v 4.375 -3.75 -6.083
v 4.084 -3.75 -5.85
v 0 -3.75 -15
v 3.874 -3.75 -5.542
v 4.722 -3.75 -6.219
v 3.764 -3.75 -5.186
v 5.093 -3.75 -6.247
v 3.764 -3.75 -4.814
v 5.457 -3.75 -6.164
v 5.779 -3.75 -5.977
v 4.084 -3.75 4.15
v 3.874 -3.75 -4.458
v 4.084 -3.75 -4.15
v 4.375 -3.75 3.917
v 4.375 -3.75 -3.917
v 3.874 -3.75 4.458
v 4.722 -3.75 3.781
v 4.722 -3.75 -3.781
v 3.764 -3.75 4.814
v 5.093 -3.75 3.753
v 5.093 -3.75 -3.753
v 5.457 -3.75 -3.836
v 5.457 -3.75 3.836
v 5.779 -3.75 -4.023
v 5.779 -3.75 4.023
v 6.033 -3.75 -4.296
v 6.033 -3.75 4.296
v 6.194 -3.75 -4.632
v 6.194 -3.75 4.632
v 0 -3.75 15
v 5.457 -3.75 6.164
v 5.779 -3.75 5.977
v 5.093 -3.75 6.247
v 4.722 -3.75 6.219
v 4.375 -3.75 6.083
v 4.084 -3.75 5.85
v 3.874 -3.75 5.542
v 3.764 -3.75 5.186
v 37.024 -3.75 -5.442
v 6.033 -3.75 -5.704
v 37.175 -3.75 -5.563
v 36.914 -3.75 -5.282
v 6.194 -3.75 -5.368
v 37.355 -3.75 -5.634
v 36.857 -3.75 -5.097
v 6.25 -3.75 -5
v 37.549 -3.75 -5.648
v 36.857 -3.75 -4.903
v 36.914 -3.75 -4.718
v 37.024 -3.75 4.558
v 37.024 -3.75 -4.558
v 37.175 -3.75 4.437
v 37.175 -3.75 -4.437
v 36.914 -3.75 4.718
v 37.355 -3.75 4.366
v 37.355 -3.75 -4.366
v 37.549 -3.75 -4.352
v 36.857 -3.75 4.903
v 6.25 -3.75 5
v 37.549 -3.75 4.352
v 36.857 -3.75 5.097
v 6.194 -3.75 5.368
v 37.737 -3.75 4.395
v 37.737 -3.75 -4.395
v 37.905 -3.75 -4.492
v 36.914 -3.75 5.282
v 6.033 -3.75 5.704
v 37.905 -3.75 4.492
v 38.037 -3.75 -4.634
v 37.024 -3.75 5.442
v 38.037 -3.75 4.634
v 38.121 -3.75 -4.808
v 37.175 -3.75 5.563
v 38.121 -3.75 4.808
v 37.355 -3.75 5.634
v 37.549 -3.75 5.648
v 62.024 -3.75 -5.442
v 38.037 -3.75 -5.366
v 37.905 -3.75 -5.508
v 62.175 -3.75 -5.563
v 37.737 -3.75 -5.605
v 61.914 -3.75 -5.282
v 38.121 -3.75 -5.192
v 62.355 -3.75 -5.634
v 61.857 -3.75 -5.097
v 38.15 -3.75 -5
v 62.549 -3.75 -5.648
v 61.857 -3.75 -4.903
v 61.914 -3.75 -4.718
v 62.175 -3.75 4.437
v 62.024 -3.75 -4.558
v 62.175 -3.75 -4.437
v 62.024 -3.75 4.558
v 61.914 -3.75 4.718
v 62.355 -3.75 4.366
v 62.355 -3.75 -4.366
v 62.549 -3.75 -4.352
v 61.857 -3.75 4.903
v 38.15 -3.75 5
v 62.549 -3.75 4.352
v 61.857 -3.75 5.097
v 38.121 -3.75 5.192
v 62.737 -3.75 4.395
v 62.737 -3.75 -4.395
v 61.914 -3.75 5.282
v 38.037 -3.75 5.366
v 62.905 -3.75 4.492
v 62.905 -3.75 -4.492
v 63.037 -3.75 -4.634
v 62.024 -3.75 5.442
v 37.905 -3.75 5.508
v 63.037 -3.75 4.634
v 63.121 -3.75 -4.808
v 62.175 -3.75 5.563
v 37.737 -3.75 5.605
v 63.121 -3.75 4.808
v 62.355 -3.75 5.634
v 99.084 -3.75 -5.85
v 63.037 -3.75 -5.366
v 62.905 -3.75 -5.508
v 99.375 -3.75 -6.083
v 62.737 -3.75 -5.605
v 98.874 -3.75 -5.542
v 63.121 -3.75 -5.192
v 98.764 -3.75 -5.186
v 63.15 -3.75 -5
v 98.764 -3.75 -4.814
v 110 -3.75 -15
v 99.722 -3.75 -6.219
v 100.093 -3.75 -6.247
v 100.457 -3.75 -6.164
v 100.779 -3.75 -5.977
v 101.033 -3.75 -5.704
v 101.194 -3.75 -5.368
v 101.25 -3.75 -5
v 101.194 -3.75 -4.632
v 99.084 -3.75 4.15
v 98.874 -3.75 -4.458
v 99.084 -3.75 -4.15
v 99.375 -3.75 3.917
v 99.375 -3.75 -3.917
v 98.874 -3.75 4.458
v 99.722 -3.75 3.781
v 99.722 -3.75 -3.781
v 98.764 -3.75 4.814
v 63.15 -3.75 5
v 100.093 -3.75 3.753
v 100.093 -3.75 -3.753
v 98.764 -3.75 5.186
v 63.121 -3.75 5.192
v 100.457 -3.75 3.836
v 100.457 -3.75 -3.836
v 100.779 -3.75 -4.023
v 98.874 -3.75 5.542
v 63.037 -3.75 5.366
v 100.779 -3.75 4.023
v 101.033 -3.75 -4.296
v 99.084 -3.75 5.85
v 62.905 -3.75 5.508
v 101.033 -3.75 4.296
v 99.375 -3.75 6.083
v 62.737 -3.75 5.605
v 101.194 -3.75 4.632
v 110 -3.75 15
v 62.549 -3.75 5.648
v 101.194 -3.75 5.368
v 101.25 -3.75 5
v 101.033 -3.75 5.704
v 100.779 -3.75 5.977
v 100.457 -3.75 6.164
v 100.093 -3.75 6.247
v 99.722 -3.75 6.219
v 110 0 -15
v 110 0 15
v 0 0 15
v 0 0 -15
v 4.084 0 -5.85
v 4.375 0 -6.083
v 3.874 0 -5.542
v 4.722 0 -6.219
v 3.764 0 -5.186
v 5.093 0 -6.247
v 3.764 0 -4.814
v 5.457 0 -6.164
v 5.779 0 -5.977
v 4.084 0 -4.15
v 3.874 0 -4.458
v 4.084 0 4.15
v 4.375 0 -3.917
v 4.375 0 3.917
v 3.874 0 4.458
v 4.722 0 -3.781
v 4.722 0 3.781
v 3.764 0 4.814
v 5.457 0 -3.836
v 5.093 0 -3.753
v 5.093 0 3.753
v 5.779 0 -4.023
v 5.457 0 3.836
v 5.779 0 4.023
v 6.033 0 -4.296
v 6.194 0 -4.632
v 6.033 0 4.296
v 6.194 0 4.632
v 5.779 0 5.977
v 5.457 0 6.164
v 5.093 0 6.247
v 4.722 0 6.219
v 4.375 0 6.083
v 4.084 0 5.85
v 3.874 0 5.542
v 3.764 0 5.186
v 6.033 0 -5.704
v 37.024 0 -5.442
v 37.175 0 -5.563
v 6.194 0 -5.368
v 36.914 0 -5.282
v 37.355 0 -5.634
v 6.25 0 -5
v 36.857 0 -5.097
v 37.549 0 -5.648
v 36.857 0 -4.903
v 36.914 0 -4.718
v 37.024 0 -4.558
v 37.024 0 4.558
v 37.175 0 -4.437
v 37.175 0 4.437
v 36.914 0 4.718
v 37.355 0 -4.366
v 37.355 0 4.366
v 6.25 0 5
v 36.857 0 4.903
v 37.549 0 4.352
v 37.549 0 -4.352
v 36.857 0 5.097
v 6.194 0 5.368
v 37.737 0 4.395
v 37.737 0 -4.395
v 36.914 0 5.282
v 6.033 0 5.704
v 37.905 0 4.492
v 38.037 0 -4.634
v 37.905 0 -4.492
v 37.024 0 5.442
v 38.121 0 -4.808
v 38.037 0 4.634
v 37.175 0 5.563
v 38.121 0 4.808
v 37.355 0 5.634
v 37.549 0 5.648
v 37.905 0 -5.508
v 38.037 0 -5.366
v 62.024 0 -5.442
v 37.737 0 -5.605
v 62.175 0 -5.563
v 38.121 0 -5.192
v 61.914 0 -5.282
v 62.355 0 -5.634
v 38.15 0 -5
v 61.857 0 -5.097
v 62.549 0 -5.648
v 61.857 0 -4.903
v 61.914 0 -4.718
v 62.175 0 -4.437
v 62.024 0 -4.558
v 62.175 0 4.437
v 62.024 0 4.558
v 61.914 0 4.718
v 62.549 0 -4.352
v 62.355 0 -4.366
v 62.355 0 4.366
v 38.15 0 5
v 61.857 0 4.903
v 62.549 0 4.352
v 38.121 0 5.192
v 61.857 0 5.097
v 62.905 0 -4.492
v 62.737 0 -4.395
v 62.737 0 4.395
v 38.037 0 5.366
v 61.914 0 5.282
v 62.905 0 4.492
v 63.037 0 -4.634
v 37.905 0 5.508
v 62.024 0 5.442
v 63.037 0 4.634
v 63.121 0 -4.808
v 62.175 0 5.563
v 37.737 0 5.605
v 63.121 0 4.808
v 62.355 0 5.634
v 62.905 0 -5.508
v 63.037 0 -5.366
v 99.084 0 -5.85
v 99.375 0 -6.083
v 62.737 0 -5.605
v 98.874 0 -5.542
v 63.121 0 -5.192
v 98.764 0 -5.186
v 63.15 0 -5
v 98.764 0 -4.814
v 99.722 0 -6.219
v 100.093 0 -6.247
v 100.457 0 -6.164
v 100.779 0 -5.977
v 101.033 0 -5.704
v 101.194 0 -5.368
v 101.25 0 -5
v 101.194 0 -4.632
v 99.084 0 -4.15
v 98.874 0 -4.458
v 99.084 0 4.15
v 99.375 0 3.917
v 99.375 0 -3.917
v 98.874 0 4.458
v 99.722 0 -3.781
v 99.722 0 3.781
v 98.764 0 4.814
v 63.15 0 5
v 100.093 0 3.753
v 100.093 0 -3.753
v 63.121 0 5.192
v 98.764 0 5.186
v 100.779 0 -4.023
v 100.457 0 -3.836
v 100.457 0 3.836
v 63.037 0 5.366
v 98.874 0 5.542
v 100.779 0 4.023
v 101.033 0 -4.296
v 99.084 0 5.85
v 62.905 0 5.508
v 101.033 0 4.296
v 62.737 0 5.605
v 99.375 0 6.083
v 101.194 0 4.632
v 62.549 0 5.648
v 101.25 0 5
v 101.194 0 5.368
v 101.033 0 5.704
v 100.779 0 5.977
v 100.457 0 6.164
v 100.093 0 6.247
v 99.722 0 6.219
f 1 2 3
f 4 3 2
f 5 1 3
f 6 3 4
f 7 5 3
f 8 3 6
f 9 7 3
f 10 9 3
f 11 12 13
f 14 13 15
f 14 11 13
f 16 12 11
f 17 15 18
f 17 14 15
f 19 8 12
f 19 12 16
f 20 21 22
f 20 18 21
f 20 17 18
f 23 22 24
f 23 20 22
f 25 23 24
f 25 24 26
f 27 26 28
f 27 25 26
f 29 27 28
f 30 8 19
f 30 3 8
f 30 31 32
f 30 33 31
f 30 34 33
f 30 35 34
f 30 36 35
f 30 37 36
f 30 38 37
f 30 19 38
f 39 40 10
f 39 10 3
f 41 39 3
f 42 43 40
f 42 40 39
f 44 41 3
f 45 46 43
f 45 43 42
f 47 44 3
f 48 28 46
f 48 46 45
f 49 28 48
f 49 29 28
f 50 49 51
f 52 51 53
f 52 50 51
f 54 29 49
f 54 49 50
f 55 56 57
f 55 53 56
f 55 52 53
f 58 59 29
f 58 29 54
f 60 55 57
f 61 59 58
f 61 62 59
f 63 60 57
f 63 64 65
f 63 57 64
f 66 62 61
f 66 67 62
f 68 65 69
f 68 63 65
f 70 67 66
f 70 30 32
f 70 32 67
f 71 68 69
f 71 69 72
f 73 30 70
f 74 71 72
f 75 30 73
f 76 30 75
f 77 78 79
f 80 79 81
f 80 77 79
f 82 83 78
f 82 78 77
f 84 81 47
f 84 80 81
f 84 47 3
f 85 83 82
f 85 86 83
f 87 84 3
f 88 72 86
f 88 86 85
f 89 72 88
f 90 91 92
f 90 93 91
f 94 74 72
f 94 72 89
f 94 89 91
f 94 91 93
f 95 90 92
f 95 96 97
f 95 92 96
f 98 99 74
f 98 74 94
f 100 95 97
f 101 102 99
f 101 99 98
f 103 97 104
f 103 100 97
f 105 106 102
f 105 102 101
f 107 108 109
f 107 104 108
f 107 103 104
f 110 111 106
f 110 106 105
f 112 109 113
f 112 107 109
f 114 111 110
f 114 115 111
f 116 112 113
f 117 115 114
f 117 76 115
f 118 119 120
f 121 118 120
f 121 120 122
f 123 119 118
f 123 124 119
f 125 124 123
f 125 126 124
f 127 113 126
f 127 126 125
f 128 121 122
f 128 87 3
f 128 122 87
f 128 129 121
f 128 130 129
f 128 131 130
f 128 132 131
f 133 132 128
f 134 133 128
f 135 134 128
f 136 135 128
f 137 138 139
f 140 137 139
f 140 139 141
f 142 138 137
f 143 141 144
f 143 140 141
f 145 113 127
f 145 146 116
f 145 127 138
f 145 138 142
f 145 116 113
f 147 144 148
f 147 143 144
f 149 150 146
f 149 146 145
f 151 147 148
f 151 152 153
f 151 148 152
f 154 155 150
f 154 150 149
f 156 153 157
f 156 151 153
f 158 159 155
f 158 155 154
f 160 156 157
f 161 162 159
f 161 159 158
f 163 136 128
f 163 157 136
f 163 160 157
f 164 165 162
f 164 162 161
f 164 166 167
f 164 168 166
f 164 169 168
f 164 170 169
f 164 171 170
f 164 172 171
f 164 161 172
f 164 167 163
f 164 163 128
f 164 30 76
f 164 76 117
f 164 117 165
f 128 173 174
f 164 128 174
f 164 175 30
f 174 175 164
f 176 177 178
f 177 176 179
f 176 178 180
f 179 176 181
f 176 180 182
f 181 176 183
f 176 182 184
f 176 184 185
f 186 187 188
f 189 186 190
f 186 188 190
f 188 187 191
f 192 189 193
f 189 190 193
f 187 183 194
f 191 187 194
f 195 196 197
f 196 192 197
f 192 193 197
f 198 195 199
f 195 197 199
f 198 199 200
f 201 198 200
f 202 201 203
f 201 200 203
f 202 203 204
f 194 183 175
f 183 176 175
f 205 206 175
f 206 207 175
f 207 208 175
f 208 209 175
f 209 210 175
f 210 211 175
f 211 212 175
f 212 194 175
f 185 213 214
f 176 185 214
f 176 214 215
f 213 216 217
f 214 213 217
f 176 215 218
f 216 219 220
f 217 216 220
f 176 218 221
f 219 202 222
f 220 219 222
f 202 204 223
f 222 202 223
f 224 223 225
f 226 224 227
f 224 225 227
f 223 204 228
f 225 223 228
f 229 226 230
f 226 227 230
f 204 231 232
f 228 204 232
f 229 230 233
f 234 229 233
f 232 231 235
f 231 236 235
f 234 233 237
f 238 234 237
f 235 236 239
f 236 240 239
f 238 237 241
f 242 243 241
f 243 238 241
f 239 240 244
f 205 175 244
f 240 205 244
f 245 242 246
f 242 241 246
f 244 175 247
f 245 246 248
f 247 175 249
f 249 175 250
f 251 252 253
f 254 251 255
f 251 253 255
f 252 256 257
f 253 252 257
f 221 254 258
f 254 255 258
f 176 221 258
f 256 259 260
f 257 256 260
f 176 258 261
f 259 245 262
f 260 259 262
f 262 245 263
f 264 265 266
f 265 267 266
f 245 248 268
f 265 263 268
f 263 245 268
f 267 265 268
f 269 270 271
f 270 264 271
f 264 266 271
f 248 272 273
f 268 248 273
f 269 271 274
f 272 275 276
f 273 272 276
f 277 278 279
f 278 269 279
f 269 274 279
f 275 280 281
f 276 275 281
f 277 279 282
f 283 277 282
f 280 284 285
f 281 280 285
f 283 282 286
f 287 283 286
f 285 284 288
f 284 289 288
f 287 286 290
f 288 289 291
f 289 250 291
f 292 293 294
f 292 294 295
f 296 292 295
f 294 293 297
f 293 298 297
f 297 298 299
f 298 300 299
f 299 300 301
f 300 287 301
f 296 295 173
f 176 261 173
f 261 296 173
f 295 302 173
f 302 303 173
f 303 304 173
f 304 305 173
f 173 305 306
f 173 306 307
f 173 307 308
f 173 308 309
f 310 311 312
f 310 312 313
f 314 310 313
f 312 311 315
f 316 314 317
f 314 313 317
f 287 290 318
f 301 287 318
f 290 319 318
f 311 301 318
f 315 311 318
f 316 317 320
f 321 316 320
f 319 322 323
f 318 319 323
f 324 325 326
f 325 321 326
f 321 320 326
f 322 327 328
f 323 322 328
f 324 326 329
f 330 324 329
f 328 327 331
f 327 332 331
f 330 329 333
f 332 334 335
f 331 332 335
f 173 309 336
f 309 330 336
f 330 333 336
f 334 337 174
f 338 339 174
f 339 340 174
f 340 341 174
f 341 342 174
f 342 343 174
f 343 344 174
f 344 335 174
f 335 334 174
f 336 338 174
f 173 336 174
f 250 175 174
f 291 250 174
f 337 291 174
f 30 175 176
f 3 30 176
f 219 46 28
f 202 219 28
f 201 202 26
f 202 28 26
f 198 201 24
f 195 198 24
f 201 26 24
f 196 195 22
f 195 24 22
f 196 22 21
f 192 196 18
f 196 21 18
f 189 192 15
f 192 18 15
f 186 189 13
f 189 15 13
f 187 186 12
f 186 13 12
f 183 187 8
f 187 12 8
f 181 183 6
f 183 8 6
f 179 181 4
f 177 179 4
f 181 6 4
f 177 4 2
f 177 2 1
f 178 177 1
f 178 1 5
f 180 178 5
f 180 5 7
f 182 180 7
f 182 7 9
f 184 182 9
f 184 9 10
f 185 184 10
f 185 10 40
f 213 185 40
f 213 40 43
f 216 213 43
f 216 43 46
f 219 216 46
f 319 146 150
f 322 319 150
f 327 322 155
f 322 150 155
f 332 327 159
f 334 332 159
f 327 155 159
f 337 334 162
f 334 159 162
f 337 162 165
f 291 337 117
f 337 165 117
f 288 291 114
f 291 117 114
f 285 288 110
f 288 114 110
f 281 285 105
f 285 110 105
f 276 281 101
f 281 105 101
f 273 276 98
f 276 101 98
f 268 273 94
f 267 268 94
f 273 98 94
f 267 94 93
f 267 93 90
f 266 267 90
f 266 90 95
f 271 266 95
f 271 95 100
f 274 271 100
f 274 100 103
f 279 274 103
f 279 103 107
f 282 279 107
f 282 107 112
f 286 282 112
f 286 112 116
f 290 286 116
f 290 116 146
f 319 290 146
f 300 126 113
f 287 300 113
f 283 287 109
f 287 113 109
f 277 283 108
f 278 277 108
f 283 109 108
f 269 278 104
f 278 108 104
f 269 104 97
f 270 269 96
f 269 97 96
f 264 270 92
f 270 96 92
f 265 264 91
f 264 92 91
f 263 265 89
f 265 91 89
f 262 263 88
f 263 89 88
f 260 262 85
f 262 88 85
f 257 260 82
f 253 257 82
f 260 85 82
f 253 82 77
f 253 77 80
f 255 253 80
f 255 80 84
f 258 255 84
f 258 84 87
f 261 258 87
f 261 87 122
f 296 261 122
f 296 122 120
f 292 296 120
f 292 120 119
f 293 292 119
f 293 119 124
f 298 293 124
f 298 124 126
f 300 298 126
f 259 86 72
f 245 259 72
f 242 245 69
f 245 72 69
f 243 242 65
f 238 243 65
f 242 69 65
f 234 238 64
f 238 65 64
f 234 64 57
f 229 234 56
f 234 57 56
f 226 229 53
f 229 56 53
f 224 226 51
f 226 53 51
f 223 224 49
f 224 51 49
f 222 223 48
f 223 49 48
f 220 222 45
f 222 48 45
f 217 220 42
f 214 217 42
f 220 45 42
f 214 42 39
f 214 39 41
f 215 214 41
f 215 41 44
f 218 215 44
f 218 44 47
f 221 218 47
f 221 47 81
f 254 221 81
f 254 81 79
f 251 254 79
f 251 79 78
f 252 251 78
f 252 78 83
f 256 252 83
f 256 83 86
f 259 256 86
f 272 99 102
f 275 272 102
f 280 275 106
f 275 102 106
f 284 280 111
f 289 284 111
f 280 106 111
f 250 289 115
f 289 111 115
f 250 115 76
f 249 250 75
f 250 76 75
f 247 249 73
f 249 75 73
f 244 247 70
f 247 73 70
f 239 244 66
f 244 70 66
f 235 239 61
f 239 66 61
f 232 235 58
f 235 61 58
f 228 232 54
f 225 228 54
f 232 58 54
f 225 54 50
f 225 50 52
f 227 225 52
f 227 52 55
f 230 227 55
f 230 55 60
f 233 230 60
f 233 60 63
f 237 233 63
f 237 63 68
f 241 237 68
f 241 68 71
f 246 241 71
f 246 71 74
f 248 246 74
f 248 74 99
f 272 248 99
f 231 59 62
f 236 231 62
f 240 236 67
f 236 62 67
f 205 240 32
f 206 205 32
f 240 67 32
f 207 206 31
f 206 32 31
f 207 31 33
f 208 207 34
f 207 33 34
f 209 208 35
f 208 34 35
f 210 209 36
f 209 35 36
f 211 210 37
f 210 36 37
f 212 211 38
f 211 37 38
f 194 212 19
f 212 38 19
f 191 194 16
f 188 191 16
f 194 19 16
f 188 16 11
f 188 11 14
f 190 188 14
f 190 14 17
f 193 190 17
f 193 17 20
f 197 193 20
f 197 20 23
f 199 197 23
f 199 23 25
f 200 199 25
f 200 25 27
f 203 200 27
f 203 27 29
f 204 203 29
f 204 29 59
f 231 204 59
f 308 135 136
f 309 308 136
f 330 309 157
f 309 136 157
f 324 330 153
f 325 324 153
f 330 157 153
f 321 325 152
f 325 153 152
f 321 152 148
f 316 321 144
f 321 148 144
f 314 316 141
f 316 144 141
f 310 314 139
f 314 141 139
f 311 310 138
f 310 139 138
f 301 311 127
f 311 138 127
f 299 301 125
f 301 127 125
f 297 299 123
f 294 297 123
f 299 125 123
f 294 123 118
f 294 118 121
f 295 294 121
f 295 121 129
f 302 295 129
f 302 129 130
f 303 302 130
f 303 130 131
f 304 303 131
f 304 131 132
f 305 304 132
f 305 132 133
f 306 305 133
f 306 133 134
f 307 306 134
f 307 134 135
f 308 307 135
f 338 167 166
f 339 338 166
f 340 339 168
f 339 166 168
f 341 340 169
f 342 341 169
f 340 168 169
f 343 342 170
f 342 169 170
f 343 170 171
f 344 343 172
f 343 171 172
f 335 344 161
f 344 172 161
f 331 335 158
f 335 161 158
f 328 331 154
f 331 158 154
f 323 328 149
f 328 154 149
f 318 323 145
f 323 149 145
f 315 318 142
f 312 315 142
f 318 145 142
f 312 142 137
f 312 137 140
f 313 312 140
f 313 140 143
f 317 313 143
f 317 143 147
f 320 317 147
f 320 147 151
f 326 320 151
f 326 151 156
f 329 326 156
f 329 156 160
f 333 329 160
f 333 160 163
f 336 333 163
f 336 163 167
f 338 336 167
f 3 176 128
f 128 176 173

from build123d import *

# Parameters (mm, degrees)
F0_W     = 110
F0_H     = 15
F1_DEPTH = 3.75
F2_R     = 1.25
F2_R_2   = 0.65
F3_DEPTH = 25


with BuildPart() as f1:
    # F0 (on Front) → F1 (new body)
    with BuildSketch(Plane.XZ):
        with Locations((55, 7.5)):
            Rectangle(F0_W, F0_H)
        with Locations((55, -7.5)):
            Rectangle(F0_W, F0_H)
    extrude(amount=F1_DEPTH)

    # F2 (on face) → F3 (cut)
    with BuildSketch(Plane.XZ.offset(3.75)):
        with Locations((5, 5)):
            Circle(F2_R)
        with Locations((100, 5)):
            Circle(F2_R)
        with Locations((62.5, 5)):
            Circle(F2_R_2)
        with Locations((37.5, 5)):
            Circle(F2_R_2)
        with Locations((5, -5)):
            Circle(F2_R)
        with Locations((37.5, -5)):
            Circle(F2_R_2)
        with Locations((62.5, -5)):
            Circle(F2_R_2)
        with Locations((100, -5)):
            Circle(F2_R)
    extrude(amount=-F3_DEPTH, mode=Mode.SUBTRACT)


solid = f1.part
